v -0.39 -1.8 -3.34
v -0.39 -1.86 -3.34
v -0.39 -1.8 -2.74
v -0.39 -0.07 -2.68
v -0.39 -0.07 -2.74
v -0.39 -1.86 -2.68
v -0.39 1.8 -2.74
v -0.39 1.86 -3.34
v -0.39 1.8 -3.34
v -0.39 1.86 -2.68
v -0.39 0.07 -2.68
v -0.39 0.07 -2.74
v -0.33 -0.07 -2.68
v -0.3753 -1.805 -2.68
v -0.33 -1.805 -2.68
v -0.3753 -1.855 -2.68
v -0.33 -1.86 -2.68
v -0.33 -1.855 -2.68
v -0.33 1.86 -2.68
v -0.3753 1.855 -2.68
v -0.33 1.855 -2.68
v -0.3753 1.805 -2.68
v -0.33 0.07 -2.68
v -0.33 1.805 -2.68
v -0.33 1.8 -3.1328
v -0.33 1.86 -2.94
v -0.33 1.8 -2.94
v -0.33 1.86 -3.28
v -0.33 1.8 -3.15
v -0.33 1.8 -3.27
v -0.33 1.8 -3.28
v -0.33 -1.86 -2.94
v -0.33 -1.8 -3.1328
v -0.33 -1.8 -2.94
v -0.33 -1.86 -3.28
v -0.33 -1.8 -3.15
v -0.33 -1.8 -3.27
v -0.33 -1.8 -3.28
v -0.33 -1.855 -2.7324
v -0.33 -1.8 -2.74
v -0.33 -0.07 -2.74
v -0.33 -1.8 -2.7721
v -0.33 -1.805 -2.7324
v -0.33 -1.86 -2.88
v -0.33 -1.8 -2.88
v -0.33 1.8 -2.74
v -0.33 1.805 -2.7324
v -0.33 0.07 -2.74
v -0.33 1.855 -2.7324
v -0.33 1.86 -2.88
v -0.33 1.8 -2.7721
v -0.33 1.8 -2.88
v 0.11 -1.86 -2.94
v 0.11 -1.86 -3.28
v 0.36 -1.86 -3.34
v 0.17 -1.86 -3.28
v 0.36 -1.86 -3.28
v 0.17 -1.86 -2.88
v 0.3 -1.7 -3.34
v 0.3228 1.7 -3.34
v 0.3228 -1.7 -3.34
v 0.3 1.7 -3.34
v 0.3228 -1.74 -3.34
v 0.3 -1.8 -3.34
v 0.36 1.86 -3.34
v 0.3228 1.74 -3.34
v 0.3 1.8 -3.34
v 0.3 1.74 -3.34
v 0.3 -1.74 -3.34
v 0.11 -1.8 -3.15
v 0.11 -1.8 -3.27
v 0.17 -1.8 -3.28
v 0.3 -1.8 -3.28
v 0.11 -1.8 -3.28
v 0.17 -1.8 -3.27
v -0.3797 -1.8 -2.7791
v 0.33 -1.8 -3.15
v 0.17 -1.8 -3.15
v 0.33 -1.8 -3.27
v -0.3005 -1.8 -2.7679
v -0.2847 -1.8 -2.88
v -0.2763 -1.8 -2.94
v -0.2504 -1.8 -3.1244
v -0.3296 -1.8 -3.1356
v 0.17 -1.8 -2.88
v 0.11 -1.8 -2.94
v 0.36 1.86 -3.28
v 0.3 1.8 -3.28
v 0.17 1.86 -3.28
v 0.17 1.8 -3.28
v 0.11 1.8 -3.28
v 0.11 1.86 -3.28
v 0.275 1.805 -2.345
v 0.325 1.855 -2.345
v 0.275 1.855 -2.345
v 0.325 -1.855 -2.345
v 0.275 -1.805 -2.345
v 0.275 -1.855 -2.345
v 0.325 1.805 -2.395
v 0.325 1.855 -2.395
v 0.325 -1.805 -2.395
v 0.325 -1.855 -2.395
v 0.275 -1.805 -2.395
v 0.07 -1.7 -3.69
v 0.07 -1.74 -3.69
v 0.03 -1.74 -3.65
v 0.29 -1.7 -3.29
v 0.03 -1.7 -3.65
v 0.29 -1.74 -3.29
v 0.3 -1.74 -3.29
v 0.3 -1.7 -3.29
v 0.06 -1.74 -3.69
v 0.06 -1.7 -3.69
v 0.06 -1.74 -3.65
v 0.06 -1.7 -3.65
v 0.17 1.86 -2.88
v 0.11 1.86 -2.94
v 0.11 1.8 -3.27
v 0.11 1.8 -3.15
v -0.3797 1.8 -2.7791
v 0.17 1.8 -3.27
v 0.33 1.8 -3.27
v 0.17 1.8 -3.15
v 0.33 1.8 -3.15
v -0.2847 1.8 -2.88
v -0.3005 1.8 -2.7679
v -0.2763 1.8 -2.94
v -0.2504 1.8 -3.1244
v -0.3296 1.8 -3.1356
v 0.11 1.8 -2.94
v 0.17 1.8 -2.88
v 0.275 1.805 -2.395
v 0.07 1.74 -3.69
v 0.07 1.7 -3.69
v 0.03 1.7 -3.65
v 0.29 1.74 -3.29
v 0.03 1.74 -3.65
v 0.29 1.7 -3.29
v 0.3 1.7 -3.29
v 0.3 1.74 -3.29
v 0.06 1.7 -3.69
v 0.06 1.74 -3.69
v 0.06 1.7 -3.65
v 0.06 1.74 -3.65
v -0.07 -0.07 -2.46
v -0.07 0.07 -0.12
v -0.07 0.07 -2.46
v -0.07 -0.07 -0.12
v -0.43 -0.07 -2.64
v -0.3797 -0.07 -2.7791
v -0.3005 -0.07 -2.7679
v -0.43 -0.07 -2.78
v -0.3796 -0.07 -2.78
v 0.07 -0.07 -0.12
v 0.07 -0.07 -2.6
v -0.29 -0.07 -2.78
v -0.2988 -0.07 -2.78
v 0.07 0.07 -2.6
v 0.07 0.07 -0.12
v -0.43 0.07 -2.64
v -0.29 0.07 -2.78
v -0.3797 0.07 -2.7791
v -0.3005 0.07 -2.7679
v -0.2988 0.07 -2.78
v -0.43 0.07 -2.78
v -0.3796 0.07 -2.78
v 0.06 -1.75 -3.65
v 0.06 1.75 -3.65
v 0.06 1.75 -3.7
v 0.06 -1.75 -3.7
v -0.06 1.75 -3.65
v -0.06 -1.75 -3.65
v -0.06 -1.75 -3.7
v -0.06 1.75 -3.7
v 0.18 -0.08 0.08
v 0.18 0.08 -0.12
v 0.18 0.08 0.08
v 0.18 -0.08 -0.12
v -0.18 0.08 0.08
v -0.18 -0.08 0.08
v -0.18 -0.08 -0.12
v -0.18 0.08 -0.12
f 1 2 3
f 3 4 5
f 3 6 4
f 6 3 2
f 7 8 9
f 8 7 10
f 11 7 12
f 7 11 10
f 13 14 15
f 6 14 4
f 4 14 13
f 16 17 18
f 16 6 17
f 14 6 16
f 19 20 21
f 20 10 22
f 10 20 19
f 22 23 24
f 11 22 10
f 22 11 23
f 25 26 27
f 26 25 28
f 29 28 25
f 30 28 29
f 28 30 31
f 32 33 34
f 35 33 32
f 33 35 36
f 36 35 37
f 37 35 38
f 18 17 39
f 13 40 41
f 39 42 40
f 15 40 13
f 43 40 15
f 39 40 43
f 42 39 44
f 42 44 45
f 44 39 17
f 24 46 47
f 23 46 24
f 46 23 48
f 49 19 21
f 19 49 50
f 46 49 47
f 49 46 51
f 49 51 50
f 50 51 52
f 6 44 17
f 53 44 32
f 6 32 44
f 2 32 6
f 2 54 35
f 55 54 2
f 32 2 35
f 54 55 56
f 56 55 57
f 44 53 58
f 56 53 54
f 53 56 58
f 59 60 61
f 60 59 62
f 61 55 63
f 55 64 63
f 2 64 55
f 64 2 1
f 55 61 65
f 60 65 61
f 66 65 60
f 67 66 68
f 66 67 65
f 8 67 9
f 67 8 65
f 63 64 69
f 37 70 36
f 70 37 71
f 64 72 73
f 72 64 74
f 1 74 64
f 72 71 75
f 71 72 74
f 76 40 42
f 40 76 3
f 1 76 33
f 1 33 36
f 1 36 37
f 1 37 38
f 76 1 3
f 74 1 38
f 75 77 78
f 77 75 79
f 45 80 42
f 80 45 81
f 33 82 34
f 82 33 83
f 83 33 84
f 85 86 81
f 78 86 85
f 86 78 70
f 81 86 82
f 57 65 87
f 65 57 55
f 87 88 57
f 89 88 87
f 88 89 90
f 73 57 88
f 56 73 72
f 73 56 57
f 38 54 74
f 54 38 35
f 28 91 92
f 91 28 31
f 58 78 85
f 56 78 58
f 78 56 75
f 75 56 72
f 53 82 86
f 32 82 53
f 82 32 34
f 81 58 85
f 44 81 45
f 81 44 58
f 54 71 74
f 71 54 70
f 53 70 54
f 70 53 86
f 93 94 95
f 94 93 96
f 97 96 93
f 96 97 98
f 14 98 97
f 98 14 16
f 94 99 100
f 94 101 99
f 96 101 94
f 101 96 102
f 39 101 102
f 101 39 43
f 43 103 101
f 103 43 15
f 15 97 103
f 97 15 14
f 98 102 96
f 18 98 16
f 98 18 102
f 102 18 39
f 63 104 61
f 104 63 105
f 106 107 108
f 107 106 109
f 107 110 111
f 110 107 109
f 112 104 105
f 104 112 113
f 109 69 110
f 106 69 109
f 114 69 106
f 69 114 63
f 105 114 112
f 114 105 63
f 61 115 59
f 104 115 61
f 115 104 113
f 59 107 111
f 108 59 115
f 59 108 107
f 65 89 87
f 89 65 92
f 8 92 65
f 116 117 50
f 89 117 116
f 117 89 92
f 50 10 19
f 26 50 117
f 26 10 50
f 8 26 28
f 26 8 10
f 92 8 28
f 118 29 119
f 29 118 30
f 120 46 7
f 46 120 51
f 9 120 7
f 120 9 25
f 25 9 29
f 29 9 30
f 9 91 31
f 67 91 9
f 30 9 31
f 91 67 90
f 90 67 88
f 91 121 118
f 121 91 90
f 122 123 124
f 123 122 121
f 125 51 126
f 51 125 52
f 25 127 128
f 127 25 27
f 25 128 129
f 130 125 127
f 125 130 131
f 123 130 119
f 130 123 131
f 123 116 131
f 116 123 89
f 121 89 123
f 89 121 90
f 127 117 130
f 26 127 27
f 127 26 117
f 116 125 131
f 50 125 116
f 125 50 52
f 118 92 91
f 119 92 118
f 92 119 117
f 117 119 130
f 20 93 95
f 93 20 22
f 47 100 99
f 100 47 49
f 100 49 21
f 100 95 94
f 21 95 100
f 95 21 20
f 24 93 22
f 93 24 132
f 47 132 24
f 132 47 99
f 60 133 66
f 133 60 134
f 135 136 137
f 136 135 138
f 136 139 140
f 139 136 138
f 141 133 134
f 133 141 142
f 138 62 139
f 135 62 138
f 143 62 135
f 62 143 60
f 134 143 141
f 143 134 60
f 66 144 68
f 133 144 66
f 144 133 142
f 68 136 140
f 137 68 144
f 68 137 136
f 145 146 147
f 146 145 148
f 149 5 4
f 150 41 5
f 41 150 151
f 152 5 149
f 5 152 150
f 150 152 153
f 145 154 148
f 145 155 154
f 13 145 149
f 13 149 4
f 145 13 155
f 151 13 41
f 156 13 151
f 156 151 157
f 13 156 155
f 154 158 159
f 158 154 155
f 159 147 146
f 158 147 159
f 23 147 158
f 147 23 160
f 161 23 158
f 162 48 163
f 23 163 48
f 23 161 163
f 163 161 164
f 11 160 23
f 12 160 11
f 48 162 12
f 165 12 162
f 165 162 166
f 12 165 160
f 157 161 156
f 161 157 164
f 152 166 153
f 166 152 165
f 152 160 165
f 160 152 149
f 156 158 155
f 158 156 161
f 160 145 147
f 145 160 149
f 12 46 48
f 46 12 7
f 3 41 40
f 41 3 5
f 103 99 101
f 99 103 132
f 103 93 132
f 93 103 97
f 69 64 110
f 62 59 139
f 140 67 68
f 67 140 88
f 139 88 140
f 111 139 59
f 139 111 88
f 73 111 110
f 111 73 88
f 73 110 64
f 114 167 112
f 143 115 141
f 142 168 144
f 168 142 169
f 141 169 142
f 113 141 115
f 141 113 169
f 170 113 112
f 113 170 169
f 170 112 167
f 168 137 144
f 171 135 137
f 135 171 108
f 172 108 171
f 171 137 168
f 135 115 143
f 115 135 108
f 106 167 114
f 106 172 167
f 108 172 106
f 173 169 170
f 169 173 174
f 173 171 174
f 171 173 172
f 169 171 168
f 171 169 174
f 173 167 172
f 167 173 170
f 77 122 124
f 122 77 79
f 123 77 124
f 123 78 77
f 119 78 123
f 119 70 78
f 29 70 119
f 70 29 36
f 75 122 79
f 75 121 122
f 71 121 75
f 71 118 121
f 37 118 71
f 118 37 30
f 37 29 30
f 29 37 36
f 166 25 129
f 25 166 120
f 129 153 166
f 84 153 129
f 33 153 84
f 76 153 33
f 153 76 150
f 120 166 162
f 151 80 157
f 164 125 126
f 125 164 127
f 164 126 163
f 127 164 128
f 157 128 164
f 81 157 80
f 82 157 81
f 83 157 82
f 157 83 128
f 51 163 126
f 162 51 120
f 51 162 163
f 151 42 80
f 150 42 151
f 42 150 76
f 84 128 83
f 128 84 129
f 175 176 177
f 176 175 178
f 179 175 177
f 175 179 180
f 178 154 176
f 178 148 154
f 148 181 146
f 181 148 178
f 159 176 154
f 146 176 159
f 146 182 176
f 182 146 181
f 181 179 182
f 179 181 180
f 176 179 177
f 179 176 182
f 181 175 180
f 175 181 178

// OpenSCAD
// file: lib/chair_kit.scad
// Chair kit — the chairlift chair shared by the double, quad, and 6-pack
// (chair.scad, chair_quad.scad, chair_6pack.scad), which differ in width,
// cushion colour, and hanger weight.
//
//     +X = forward (direction the chair travels along the cable)
//     +Y = seat width (lateral, perpendicular to cable)
//     +Z = up
//
// The origin is the cable-attachment point and the chair hangs in -Z. A
// grip clamps the cable; a hanger drops behind the riders to a yoke over
// the backrest; side frames carry the seat, armrests, and a restraint bar
// (shown raised); a footrest hangs under the riders' feet. Riders are
// placed by the slots with their feet on the footrest, which hangs
// cable_h below the cable: the cable's height at a station
// (world.BullwheelHeight), so at the bullwheel a rider's skis are on the
// snow as the chair picks them up or sets them down. Everything else
// hangs from the seat height that gives.
//
// Conventions, units, and axis docs: see models-src/README.md.

$fn = 10;

// ── Shared dimensions (metres) ─────────────────────────────────────────
cable_h       = 3.65;  // world.BullwheelHeight
chair_depth   = 0.66;  // seat front to back (X)
foot_top_z    = -cable_h;          // footrest top: where riders' feet go (the slots)
seat_top_z    = foot_top_z + 0.50; // top of the seat cushion
seat_cushion  = 0.12;
seat_frame_z  = seat_top_z - seat_cushion - 0.04; // bar under the cushion
back_x        = -chair_depth / 2;                 // back edge of the seat
back_bot_z    = seat_top_z + 0.02;
back_top_z    = seat_top_z + 0.38;
back_cushion  = 0.08;
yoke_z        = seat_top_z + 0.44; // the bar over the backrest
restraint_z   = seat_top_z + 0.78; // the raised restraint bar, clear of riders' heads
grip_len      = 0.36;
foot_x        = 0;     // under the riders, at the slots' X
bar          = 0.06;   // frame tube section
frame_color   = [0.24, 0.26, 0.29];
grip_color    = [0.55, 0.57, 0.60];

// A box between two points, `s` thick: a frame tube.
module tube(a, b, s = bar) {
    hull() {
        translate(a) cube(s, center = true);
        translate(b) cube(s, center = true);
    }
}

// ── The chair ──────────────────────────────────────────────────────────
// w: seat width; cushion: seat and backrest colour; hanger: hanger section.
module chair(w, cushion, hanger = 0.10) {
    half = w / 2;
    ex = half + 0.03; // side frames, just outside the seat

    // Grip on the cable.
    color(grip_color)
        translate([0, 0, -0.02])
            cube([grip_len, 0.16, 0.20], center = true);

    color(frame_color) {
        // Hanger: down from the grip, then back over the riders' heads to
        // the yoke.
        tube([0, 0, -0.08], [0, 0, yoke_z + 0.18], hanger);
        tube([0, 0, yoke_z + 0.18], [back_x - 0.03, 0, yoke_z], hanger);
        // Yoke over the backrest, the full width.
        tube([back_x - 0.03, -ex, yoke_z], [back_x - 0.03, ex, yoke_z]);
        for (s = [-1, 1]) {
            y = s * ex;
            // Side frame: down the back, then forward under the seat.
            tube([back_x - 0.03, y, yoke_z], [back_x - 0.03, y, seat_frame_z]);
            tube([back_x - 0.03, y, seat_frame_z], [-back_x, y, seat_frame_z]);
            // Armrest with a post at its front.
            tube([back_x - 0.03, y, seat_top_z + 0.24], [0.14, y, seat_top_z + 0.24]);
            tube([0.14, y, seat_top_z + 0.24], [0.14, y, seat_frame_z]);
            // Restraint bar arm, raised: from the yoke up and forward.
            tube([back_x - 0.03, y, yoke_z], [0.30, y, restraint_z], 0.05);
            // Footrest hanger from the front of the seat.
            tube([-back_x - 0.02, s * (half - 0.08), seat_frame_z],
                 [foot_x + 0.05, s * (half - 0.08), foot_top_z - 0.02], 0.04);
        }
        // Restraint bar across the front, raised clear of the riders.
        tube([0.30, -ex, restraint_z], [0.30, ex, restraint_z], 0.05);
        // Cross tube under the front of the seat.
        tube([-back_x, -ex, seat_frame_z], [-back_x, ex, seat_frame_z]);
        // Footrest: the riders stand their skis on it.
        translate([foot_x, 0, foot_top_z - 0.025])
            cube([0.12, w - 0.1, 0.05], center = true);
    }

    color(cushion) {
        // Seat cushion.
        translate([0, 0, seat_top_z - seat_cushion / 2])
            cube([chair_depth, w, seat_cushion], center = true);
        // Backrest cushion, leaning back a touch.
        translate([back_x + back_cushion / 2, 0, back_bot_z])
            rotate([0, -8, 0])
                translate([0, 0, (back_top_z - back_bot_z) / 2])
                    cube([back_cushion, w, back_top_z - back_bot_z], center = true);
    }
}
// main file
// Chairlift chair — a high-speed detachable 6-pack, built from the chair
// kit (lib/chair_kit.scad) with a heavier hanger for the bigger frame.
//
// Conventions, units, and axis docs: see models-src/README.md.

include <lib/chair_kit.scad>

seat_w = 3.60; // 6-person: 6 × 0.60 m centre-to-centre

chair(seat_w, [0.16, 0.20, 0.30], hanger = 0.14);

// ── Passenger seat anchors ─────────────────────────────────────────────
// Six slots at y = ±0.30, ±0.90, ±1.50 (0.60 m centre-to-centre).
slot_x       = 0;
slot_y1      = 0.30;   // inner pair
slot_y2      = 0.90;   // middle pair
slot_y3      = 1.50;   // outer pair
slot_z       = foot_top_z;

echo("MOGUL_META", "slot", 0, slot_x, -slot_y3, slot_z);
echo("MOGUL_META", "slot", 1, slot_x, -slot_y2, slot_z);
echo("MOGUL_META", "slot", 2, slot_x, -slot_y1, slot_z);
echo("MOGUL_META", "slot", 3, slot_x,  slot_y1, slot_z);
echo("MOGUL_META", "slot", 4, slot_x,  slot_y2, slot_z);
echo("MOGUL_META", "slot", 5, slot_x,  slot_y3, slot_z);
